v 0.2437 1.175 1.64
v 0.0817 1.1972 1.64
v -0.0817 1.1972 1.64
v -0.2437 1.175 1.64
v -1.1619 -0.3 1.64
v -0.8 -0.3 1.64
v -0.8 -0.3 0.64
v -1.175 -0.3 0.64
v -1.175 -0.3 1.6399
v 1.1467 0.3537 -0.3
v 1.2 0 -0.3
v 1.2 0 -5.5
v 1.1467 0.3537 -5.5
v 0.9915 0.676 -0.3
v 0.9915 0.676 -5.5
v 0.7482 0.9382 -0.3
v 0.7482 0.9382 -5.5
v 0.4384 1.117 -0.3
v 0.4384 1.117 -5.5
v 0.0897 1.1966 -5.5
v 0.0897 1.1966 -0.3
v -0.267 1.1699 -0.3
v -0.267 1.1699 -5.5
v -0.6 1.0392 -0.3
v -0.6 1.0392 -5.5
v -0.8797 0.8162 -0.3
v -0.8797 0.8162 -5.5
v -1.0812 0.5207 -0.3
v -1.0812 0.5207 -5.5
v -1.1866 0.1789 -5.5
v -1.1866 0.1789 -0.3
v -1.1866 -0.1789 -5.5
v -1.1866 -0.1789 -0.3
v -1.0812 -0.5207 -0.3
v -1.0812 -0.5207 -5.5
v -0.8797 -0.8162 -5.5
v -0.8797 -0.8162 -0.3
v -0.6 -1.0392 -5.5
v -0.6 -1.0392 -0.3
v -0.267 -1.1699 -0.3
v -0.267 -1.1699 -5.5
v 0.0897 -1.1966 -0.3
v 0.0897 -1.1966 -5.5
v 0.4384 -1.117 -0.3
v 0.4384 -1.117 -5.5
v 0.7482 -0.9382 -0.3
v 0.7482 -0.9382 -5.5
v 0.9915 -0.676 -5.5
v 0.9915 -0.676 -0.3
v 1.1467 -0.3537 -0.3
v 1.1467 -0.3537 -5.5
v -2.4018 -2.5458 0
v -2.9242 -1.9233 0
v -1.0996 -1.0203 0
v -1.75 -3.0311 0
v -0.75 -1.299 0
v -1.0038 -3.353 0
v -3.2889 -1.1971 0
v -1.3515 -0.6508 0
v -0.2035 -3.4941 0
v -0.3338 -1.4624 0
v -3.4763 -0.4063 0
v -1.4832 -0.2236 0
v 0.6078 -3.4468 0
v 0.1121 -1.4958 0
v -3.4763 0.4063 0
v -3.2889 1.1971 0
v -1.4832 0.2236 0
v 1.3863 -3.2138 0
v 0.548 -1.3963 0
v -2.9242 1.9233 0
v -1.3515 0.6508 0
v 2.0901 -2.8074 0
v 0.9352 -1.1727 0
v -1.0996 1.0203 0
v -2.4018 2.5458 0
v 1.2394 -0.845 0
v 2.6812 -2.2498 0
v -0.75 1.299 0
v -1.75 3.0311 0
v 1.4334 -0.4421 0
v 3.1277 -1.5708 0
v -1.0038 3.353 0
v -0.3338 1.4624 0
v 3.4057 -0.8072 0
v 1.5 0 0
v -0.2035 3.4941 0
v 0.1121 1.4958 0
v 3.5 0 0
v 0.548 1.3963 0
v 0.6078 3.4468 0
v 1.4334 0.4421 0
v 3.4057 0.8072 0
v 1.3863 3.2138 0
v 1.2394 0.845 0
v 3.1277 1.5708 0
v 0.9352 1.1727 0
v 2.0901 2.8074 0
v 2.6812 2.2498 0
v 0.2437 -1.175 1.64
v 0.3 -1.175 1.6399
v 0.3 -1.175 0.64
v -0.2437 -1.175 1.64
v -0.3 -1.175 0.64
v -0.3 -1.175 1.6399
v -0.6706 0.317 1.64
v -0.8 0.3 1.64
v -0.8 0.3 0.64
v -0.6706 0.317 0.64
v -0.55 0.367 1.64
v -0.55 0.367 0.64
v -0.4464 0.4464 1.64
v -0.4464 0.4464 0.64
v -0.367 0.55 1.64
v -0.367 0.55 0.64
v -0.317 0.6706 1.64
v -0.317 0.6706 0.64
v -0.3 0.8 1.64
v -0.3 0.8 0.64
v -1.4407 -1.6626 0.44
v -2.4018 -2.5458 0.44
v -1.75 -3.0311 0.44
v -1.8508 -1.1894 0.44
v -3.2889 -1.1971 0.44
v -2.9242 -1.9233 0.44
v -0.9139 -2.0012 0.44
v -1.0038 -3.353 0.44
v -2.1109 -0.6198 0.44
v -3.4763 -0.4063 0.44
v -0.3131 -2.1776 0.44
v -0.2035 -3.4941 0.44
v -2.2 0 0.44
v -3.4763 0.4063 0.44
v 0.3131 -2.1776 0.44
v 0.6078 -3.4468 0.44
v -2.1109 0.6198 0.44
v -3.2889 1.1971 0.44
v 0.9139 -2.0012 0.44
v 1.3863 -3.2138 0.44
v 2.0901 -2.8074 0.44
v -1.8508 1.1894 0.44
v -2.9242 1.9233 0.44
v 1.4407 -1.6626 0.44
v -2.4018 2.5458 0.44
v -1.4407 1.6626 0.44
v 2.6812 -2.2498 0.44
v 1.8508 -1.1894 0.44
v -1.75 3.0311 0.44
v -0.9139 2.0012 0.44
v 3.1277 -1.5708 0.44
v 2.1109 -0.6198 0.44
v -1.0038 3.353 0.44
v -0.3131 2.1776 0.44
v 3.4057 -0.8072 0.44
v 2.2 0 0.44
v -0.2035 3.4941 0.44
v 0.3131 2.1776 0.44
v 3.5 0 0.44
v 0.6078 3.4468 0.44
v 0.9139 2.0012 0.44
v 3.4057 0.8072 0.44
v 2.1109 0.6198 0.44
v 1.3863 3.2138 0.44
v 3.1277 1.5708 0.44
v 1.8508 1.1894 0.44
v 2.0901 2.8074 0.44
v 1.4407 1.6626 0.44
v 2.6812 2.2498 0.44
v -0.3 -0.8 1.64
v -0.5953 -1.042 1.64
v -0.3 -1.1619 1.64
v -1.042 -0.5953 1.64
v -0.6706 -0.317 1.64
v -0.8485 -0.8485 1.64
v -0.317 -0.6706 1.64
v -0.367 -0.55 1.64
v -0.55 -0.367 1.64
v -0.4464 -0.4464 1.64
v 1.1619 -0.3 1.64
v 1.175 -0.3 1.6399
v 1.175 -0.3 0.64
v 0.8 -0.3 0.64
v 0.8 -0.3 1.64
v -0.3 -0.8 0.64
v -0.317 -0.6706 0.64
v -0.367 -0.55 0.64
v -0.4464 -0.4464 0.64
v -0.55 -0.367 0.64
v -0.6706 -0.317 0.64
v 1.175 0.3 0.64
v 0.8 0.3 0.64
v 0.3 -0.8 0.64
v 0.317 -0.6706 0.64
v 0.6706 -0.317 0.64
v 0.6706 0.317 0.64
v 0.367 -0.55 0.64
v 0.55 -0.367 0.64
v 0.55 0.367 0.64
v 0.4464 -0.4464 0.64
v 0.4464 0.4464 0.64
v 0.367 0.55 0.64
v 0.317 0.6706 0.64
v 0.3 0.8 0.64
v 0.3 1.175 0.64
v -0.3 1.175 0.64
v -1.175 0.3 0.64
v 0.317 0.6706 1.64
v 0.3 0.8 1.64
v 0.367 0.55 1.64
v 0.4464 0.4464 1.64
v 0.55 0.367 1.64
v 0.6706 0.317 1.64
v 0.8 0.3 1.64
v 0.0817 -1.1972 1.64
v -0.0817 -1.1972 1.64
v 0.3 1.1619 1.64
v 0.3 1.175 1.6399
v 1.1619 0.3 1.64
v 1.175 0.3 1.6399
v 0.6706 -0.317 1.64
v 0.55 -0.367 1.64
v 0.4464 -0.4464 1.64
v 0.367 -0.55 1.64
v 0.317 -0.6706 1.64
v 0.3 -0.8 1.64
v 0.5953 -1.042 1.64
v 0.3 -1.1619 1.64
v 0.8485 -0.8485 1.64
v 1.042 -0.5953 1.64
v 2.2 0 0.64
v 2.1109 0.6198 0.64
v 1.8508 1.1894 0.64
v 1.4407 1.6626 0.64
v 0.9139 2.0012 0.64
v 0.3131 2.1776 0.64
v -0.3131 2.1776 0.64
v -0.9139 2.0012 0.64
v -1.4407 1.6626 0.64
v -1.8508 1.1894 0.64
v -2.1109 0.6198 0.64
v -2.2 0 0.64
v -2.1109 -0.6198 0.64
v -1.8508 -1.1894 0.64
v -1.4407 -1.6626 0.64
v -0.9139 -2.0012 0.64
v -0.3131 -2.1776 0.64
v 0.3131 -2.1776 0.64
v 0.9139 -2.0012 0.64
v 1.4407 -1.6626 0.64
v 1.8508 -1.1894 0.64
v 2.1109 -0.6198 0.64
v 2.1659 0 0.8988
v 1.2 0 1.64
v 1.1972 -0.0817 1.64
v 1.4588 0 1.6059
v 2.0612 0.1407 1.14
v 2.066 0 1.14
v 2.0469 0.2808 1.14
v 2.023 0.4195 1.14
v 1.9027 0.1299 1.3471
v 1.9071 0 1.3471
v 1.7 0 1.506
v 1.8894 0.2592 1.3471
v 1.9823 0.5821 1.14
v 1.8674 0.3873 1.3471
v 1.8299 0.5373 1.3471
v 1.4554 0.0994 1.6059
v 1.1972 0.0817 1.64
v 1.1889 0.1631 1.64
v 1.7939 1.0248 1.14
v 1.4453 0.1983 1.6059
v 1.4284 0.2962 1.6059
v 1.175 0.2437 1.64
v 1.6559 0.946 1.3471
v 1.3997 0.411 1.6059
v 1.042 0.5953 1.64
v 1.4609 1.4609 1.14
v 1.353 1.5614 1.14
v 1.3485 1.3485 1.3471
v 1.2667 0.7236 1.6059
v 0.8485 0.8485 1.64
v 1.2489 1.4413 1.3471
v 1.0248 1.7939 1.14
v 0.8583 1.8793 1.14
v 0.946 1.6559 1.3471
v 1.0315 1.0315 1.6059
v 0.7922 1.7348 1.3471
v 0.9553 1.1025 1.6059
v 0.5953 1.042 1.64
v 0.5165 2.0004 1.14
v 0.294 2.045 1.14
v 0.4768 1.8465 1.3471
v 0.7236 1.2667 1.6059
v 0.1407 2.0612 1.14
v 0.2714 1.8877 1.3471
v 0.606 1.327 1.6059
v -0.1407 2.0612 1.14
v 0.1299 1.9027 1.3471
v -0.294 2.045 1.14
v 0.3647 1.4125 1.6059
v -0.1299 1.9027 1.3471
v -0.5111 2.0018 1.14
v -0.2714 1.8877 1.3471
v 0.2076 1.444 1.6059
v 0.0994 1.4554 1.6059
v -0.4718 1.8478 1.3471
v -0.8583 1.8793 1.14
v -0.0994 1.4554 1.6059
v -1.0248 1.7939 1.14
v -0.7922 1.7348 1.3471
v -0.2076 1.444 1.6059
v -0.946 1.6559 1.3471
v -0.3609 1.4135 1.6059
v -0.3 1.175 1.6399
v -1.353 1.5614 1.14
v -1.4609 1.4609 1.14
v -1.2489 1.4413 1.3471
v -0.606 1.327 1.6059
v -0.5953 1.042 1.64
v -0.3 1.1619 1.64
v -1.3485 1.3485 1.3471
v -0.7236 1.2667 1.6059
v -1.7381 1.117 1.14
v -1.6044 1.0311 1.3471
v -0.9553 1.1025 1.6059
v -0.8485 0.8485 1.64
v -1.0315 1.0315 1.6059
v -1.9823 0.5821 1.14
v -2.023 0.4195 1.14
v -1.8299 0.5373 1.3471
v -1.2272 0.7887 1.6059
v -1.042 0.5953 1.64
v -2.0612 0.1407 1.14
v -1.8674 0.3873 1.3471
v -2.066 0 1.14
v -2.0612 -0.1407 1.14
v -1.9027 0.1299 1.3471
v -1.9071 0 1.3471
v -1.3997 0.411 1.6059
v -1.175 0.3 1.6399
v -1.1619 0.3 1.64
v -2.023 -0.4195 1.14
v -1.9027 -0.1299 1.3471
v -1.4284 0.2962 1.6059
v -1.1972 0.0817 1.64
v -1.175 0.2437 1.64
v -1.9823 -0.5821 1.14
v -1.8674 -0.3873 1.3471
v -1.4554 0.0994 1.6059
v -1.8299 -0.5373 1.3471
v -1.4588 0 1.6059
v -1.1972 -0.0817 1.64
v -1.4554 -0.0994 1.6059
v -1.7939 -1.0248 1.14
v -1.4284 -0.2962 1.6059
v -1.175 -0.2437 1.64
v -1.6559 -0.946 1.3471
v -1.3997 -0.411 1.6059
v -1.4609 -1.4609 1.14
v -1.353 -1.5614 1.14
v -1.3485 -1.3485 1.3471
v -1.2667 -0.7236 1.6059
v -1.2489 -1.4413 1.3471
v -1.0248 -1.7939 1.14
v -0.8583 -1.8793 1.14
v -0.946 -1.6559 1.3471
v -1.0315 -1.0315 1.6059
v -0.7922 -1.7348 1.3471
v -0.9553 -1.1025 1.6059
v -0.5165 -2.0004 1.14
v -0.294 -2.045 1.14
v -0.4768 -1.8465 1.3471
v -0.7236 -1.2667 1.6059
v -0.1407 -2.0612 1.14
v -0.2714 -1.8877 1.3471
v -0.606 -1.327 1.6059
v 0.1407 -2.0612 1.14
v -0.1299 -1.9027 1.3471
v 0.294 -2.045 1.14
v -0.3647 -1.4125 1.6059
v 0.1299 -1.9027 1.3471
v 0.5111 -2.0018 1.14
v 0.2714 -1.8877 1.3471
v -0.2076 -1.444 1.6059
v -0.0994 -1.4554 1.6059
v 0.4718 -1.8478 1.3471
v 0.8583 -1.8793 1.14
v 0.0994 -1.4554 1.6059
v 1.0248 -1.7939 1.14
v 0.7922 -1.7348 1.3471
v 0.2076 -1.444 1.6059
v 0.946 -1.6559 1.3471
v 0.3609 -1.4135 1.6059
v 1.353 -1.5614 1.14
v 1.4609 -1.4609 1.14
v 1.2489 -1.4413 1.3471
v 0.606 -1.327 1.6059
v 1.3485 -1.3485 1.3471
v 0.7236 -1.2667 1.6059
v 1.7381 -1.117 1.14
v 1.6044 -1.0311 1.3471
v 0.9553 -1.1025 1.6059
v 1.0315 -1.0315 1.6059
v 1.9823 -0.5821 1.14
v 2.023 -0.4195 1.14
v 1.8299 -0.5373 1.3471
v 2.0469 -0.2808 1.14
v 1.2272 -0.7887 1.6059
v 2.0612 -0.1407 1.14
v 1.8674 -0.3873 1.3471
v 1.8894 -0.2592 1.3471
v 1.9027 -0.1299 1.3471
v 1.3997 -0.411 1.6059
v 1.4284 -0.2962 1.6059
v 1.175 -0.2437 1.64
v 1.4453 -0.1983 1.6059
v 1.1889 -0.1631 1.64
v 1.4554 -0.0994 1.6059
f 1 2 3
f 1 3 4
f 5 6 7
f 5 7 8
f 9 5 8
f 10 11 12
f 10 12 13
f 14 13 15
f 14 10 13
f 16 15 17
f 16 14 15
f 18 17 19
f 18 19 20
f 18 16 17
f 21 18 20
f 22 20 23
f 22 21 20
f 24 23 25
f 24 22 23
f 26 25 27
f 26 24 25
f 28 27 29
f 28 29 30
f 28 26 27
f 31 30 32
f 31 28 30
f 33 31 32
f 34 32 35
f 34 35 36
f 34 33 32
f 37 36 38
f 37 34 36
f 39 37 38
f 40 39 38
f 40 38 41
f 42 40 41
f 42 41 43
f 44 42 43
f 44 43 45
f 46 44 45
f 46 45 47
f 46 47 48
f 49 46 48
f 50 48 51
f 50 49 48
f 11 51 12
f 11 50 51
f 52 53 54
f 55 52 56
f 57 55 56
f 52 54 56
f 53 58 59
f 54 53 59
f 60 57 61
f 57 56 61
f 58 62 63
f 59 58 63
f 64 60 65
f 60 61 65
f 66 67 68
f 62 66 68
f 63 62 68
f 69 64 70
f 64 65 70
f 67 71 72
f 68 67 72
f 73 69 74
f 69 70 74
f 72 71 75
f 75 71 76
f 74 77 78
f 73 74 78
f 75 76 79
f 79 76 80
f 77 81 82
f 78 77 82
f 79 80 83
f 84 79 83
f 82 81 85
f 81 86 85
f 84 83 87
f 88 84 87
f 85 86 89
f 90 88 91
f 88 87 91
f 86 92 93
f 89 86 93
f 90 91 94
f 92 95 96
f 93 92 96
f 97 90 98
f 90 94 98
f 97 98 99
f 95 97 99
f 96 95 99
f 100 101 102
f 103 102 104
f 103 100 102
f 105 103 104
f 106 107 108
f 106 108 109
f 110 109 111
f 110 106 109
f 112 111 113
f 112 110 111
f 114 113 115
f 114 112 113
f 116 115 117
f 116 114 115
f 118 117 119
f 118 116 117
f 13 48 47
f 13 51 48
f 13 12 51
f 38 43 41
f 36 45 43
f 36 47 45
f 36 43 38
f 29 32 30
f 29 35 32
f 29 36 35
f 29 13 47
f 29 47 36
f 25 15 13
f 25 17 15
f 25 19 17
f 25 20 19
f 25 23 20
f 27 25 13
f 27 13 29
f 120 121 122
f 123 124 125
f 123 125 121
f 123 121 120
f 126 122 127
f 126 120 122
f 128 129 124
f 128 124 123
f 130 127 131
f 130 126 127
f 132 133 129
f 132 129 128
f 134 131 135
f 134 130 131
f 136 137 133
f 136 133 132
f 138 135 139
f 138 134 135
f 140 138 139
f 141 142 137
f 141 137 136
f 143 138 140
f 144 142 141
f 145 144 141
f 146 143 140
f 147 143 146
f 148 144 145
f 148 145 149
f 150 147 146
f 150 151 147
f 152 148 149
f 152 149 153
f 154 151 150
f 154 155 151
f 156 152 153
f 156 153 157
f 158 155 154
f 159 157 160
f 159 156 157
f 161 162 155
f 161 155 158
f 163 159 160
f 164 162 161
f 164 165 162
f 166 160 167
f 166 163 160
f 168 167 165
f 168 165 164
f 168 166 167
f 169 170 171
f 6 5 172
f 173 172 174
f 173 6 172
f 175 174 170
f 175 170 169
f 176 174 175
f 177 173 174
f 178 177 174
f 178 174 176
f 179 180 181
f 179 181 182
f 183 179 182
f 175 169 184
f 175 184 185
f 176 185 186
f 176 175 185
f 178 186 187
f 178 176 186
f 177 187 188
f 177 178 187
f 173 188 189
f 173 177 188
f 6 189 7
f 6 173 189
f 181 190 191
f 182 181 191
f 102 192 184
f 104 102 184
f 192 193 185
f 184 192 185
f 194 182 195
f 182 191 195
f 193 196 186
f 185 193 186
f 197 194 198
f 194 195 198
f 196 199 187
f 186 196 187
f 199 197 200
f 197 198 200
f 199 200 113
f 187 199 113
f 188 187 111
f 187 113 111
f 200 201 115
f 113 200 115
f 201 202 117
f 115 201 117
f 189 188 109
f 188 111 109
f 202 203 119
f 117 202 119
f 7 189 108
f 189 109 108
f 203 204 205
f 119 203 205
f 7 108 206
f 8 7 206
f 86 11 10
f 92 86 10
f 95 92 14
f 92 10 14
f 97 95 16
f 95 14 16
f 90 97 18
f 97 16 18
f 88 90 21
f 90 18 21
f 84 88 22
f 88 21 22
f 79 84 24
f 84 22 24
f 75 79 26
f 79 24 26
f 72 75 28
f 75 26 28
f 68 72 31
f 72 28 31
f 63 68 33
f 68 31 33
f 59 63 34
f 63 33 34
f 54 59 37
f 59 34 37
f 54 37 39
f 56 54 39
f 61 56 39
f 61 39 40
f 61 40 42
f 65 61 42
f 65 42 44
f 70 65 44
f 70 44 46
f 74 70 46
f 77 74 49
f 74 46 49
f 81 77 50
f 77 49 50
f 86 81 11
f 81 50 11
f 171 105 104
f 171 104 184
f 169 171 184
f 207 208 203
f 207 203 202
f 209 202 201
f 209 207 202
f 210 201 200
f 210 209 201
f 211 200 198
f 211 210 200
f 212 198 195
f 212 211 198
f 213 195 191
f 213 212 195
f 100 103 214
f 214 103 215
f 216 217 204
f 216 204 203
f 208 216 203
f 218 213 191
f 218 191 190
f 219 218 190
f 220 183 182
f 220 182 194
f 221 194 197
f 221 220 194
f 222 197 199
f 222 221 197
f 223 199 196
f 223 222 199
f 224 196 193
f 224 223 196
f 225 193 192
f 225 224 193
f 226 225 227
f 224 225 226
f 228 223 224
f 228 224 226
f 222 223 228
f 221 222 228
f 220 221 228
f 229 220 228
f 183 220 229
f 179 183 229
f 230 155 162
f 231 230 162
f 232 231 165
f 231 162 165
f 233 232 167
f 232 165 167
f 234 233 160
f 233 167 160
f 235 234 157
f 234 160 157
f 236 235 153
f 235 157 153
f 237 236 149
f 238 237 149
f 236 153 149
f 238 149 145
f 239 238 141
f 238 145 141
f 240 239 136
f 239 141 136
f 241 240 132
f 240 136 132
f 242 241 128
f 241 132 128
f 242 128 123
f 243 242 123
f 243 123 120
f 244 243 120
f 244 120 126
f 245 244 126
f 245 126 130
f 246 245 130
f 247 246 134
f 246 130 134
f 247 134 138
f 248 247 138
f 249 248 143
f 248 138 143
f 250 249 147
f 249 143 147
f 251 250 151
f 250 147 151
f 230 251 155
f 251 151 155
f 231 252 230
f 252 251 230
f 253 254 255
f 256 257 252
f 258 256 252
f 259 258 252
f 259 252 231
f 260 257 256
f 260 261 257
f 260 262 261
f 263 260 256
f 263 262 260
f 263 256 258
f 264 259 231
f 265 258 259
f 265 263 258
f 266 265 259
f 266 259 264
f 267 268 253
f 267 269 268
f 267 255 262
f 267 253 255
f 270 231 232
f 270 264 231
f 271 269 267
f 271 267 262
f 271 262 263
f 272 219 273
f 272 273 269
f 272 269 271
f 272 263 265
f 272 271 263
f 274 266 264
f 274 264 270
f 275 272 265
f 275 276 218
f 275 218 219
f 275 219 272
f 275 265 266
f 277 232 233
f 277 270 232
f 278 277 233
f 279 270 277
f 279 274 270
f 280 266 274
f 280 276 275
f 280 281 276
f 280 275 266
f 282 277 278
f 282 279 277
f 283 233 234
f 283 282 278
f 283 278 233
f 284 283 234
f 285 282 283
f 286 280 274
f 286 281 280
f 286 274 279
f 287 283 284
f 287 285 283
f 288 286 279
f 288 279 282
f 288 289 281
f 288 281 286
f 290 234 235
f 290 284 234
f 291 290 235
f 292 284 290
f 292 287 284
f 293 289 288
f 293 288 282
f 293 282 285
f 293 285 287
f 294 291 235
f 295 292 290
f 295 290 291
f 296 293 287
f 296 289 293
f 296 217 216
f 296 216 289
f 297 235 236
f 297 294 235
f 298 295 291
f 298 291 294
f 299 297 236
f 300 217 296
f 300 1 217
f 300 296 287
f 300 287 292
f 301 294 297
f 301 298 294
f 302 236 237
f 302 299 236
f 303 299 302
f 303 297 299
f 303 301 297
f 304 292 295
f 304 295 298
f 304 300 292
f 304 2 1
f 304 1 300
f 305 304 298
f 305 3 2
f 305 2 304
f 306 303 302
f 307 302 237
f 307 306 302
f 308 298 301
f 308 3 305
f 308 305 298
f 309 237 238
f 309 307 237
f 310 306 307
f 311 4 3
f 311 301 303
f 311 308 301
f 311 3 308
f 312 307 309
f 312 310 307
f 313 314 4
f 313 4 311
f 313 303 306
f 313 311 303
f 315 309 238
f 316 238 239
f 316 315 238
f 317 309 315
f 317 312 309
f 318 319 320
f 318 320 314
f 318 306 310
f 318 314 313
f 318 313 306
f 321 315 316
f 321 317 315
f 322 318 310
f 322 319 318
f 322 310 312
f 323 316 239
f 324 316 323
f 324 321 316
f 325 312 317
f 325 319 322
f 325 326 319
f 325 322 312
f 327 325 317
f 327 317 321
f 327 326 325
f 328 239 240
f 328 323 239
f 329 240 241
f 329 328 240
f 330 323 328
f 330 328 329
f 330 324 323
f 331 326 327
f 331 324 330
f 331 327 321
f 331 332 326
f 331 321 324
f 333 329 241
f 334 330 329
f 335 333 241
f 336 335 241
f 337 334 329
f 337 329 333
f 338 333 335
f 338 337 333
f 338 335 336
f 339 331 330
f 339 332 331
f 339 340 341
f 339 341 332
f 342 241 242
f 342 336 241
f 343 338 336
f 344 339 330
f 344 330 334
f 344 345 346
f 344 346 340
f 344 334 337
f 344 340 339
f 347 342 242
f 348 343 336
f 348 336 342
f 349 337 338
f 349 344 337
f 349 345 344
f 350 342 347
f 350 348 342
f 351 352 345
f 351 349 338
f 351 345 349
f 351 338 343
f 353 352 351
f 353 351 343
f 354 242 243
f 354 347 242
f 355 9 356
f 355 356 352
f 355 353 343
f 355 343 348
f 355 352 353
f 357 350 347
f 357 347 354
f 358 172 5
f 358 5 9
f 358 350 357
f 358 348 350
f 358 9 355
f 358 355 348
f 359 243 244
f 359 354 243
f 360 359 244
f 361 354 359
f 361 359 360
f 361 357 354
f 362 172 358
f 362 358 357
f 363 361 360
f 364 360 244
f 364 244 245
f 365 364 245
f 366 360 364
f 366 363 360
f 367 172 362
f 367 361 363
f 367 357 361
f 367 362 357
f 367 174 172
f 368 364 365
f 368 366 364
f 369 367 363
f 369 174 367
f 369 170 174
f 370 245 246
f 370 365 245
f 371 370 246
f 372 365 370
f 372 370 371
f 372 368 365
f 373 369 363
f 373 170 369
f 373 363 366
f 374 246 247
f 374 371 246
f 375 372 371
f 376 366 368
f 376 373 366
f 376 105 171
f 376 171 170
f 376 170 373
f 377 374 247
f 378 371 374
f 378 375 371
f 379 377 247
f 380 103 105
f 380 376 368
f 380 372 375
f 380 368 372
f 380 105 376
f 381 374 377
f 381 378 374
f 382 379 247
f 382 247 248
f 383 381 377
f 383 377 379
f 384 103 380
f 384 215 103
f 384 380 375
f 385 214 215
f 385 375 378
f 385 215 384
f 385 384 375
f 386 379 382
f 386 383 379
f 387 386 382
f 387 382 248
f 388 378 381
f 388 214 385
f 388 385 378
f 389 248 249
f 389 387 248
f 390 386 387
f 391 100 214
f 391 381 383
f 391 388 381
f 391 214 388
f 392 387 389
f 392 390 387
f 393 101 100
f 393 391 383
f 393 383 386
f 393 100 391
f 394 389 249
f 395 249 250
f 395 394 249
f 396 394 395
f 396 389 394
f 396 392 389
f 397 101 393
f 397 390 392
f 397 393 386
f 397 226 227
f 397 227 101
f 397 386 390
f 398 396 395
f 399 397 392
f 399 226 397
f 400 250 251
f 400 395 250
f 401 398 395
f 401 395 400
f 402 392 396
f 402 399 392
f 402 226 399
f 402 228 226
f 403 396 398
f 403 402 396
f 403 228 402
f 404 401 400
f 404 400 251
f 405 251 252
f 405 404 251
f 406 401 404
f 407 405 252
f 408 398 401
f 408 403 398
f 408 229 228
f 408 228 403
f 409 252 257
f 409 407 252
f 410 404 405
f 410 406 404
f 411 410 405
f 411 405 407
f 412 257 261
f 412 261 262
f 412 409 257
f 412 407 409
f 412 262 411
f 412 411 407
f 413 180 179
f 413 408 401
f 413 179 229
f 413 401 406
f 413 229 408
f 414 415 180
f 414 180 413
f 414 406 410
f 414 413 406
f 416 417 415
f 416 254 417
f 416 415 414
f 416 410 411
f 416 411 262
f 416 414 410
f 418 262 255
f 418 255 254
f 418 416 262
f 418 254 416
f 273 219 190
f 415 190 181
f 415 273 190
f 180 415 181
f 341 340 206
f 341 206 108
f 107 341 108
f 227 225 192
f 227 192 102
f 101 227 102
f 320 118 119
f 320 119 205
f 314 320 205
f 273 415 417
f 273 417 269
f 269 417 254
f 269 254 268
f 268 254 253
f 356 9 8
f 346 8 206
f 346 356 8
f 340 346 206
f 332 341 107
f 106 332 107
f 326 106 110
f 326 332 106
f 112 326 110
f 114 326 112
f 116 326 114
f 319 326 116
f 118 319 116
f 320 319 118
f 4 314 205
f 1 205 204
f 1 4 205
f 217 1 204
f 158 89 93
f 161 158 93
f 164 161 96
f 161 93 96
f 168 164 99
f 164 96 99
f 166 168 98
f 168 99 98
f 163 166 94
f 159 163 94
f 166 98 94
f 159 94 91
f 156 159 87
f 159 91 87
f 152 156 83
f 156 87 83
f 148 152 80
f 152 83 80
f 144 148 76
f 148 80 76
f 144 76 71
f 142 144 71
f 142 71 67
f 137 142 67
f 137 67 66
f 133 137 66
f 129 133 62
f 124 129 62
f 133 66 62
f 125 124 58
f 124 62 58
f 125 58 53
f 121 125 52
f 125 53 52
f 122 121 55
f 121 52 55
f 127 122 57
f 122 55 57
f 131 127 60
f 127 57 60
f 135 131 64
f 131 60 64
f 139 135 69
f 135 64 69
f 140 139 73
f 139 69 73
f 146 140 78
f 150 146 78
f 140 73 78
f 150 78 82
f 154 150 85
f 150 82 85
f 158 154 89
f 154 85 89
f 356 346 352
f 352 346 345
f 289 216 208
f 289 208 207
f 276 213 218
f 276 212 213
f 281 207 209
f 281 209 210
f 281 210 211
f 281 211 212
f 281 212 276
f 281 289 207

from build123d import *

# Parameters (mm, degrees)
SKETCH003_W  = 1.2
SKETCH003_H  = 5.5
SKETCH_R     = 3.5
PAD_DEPTH    = 0.44
SKETCH001_R  = 2.2
PAD001_DEPTH = 1.2
FILLET_R     = 1
POCKET_DEPTH = 1
CHAMFER_SIZE = 0.3


with BuildPart() as screw_body:
    # Sketch003 → Revolution (revolve)
    with BuildSketch(Plane.XZ):
        with Locations((0.6, -2.75)):
            Rectangle(SKETCH003_W, SKETCH003_H)
    revolve(axis=Axis((0, 0, 0), (0, 0, 1)))


with BuildPart() as chamfer_body:
    # Sketch → Pad (new body)
    with BuildSketch(Plane.XY):
        Circle(SKETCH_R)
    extrude(amount=PAD_DEPTH)

    # Sketch001 → Pad001 (new body)
    with BuildSketch(Plane.XY.offset(0.44)):
        Circle(SKETCH001_R)
    extrude(amount=PAD001_DEPTH)

    # Fillet
    fillet_edges = [chamfer_body.edges().sort_by_distance(p)[0] for p in [
        (-2.2, 0, 1.64),
    ]]
    fillet(fillet_edges, radius=FILLET_R)

    # Sketch002 → Pocket (cut)
    with BuildSketch(Plane.XY.offset(1.64)):
        with BuildLine():
            Line((-0.3, 1.175), (0.3, 1.175))
            Line((0.3, 1.175), (0.3, 0.8))
            ThreePointArc((0.3, 0.8), (0.446447, 0.446447), (0.8, 0.3))
            Line((0.8, 0.3), (1.175, 0.3))
            Line((1.175, 0.3), (1.175, -0.3))
            Line((1.175, -0.3), (0.8, -0.3))
            ThreePointArc((0.8, -0.3), (0.446447, -0.446447), (0.3, -0.8))
            Line((0.3, -0.8), (0.3, -1.175))
            Line((0.3, -1.175), (-0.3, -1.175))
            Line((-0.3, -1.175), (-0.3, -0.8))
            ThreePointArc((-0.3, -0.8), (-0.446447, -0.446447), (-0.8, -0.3))
            Line((-0.8, -0.3), (-1.175, -0.3))
            Line((-1.175, -0.3), (-1.175, 0.3))
            Line((-1.175, 0.3), (-0.8, 0.3))
            ThreePointArc((-0.8, 0.3), (-0.446447, 0.446447), (-0.3, 0.8))
            Line((-0.3, 0.8), (-0.3, 1.175))
        make_face()
    extrude(amount=-POCKET_DEPTH, mode=Mode.SUBTRACT)

    # Fusion: union screw-body
    add(screw_body.part)

    # Chamfer
    chamfer_edges = [chamfer_body.edges().sort_by_distance(p)[0] for p in [
        (-1.2, 0, 0),
    ]]
    chamfer(chamfer_edges, length=CHAMFER_SIZE)


solid = chamfer_body.part
